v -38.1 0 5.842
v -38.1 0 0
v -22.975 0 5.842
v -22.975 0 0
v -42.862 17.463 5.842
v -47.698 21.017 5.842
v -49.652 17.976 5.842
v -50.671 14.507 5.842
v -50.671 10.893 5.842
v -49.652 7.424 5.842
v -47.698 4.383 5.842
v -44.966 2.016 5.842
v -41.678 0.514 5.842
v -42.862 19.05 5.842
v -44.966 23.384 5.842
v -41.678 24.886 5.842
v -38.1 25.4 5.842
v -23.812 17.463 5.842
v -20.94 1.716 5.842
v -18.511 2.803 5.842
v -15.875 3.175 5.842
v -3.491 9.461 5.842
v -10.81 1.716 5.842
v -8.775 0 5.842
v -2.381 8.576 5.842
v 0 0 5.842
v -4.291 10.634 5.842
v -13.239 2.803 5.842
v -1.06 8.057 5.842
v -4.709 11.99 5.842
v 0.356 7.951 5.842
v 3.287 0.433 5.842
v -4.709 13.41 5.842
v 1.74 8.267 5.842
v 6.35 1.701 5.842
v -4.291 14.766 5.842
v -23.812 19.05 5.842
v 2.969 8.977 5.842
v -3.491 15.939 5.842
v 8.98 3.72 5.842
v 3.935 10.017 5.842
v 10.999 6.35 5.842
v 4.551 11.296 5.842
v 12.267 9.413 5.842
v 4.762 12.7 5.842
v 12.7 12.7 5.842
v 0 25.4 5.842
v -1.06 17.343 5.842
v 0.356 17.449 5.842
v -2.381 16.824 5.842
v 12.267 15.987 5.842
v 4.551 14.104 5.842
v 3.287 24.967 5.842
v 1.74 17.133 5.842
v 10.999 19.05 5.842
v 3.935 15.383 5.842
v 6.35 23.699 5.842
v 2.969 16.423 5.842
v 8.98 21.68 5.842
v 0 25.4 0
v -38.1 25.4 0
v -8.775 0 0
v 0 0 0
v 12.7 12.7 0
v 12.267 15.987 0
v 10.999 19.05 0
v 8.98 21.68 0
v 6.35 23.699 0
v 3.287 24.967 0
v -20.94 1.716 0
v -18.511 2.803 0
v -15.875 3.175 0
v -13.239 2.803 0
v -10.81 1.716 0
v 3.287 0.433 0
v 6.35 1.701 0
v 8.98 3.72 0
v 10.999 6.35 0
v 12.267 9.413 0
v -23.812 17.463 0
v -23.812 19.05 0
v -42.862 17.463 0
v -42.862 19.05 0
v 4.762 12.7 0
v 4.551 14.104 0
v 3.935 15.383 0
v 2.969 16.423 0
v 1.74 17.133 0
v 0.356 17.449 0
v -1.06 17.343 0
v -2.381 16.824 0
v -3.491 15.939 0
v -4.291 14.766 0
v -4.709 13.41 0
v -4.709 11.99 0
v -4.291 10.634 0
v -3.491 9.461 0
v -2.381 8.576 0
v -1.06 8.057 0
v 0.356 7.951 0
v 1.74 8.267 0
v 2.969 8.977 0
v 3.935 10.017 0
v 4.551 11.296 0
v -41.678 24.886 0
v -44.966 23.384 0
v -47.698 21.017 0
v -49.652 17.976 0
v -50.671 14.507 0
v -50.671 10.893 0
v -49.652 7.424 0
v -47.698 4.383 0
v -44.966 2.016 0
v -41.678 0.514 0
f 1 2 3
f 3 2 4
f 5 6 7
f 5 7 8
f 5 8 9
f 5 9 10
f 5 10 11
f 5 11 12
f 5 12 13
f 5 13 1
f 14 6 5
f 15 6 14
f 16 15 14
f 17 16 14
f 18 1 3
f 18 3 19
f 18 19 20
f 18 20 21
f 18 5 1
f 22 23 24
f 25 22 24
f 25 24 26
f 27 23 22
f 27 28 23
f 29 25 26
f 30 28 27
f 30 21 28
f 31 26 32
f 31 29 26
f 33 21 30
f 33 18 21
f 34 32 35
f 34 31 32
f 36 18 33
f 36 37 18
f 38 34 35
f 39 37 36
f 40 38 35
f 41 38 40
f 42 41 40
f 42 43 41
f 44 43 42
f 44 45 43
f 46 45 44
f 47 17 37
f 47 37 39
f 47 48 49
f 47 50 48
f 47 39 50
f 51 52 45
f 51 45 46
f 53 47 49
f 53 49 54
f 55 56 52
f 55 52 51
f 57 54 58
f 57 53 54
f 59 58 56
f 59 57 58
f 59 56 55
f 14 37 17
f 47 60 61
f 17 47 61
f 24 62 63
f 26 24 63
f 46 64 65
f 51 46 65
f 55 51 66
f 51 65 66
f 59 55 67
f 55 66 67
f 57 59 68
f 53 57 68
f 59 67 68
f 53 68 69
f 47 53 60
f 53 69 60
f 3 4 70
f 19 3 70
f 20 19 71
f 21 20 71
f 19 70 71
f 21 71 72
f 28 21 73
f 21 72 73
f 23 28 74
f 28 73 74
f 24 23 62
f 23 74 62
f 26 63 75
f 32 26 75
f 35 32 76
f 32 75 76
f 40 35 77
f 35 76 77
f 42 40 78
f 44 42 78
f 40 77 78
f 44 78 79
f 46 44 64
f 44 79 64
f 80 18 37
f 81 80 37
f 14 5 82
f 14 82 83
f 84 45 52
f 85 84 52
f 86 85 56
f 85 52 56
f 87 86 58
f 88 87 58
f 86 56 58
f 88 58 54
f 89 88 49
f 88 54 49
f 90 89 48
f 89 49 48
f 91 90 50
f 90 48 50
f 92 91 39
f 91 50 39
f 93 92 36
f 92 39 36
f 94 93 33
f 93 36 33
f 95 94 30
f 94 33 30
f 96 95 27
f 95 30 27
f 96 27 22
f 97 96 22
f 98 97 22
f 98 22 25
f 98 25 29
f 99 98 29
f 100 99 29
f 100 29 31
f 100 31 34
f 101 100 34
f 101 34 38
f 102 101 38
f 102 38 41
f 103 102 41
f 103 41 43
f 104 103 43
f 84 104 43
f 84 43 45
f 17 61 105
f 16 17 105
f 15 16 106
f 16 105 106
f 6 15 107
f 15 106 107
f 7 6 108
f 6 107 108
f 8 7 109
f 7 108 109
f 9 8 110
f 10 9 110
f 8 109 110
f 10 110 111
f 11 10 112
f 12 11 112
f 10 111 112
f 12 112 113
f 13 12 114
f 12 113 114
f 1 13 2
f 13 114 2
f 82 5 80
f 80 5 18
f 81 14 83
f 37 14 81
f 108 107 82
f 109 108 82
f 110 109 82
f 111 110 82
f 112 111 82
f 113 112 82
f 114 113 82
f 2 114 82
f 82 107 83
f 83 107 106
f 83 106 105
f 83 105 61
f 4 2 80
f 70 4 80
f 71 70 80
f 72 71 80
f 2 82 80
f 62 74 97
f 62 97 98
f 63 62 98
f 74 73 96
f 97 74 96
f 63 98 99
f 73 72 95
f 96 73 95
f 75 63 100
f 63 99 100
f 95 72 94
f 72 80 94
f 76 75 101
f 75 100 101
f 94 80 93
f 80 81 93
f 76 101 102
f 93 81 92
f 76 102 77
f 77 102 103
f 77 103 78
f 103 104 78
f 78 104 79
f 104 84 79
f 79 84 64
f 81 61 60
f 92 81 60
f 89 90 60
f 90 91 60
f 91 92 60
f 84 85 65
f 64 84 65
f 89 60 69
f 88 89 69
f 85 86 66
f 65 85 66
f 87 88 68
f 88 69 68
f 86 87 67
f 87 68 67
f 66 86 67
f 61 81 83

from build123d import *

# Parameters (mm, degrees)
F1_DEPTH = 5.842
F2_R     = 4.7625
F3_DEPTH = 25.4
F4_W     = 19.05
F4_H     = 1.5875
F5_DEPTH = 25.4
F7_DEPTH = 25.4


# Not quite as in the source:
# - a feature names something its author has since deleted; it is built from what else it names


with BuildPart() as f1:
    # F0 (on Top) → F1 (new body)
    with BuildSketch(Plane.XY):
        with BuildLine():
            Line((-38.1, 25.4), (-38.1, 0))
            ThreePointArc((-38.1, 0), (-29.1197438789, 3.7197438789), (-25.4, 12.7))
            ThreePointArc((-25.4, 12.7), (-29.1197438789, 21.6802561211), (-38.1, 25.4))
        make_face()
        with BuildLine():
            ThreePointArc((0, 25.4), (-12.7, 12.7), (0, 0))
            Line((0, 0), (0, 25.4))
        make_face()
        with BuildLine():
            Line((-38.1, 0), (0, 0))
            ThreePointArc((0, 0), (-12.7, 12.7), (0, 25.4))
            Line((0, 25.4), (-38.1, 25.4))
            ThreePointArc((-38.1, 25.4), (-29.1197438789, 21.6802561211), (-25.4, 12.7))
            ThreePointArc((-25.4, 12.7), (-29.1197438789, 3.7197438789), (-38.1, 0))
        make_face()
        with BuildLine():
            Line((0, 25.4), (0, 0))
            ThreePointArc((0, 0), (8.9802561211, 3.7197438789), (12.7, 12.7))
            ThreePointArc((12.7, 12.7), (8.9802561211, 21.6802561211), (0, 25.4))
        make_face()
        with BuildLine():
            ThreePointArc((-38.1, 25.4), (-50.8, 12.7), (-38.1, 0))
            Line((-38.1, 0), (-38.1, 25.4))
        make_face()
    extrude(amount=F1_DEPTH)

    # F2 (on face) → F3 (cut)
    with BuildSketch(Plane.XY.offset(5.842)):
        with Locations((0, 12.7)):
            Circle(F2_R)
    extrude(amount=-F3_DEPTH, mode=Mode.SUBTRACT)

    # F4 (on face) → F5 (cut)
    with BuildSketch(Plane.XY.offset(5.842)):
        with Locations((-33.3375, 18.25625)):
            Rectangle(F4_W, F4_H)
    extrude(amount=-F5_DEPTH, mode=Mode.SUBTRACT)

    # F6 (on face) → F7 (cut)
    with BuildSketch(Plane(origin=(0, 0, 0), x_dir=(1, 0, 0), z_dir=(0, 0, -1))):
        with BuildLine():
            Line((-8.7754841714, 0), (-22.9745158286, 0))
            ThreePointArc((-22.9745158286, 0), (-15.875, -3.175), (-8.7754841714, 0))
        make_face()
    extrude(amount=-F7_DEPTH, mode=Mode.SUBTRACT)


solid = f1.part
